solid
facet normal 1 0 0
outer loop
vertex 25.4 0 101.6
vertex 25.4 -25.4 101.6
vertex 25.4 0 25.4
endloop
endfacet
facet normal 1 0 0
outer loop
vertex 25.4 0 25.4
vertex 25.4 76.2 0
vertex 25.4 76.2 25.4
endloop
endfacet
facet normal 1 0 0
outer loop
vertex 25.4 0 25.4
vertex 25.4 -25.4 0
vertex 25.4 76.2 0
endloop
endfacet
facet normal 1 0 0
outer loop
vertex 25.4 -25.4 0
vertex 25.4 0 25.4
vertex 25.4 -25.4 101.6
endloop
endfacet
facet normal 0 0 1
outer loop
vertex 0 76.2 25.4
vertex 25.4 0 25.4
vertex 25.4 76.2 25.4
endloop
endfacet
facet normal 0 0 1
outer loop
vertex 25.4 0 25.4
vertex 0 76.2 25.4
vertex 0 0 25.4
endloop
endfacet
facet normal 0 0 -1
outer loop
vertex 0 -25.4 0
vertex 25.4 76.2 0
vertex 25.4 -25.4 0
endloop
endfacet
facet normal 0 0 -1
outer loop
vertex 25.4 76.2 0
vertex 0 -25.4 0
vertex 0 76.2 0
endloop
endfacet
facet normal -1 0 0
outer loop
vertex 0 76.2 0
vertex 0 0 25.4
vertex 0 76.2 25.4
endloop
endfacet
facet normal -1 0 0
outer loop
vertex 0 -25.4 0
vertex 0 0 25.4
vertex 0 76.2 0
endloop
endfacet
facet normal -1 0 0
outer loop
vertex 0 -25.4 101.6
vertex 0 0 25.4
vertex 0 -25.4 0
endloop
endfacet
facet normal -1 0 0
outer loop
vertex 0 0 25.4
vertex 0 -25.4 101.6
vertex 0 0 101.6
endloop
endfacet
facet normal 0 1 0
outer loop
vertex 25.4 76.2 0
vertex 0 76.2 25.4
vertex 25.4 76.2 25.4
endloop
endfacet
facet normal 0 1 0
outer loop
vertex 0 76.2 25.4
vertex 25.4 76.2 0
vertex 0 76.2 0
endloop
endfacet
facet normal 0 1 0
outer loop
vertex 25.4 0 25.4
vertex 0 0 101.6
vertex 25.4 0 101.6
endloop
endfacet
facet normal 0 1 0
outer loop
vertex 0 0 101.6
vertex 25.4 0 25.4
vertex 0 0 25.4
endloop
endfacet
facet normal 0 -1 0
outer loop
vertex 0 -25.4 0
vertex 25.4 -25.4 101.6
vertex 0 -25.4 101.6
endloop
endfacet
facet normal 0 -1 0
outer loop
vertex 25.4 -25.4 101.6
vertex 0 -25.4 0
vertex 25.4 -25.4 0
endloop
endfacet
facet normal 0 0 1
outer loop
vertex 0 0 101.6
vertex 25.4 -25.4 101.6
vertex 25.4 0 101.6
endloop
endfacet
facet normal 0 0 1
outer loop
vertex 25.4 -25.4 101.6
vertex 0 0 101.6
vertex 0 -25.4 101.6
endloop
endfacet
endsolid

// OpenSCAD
inch = 25.4;

cube([inch, (3 * inch), inch]);

rotate([90, 0, 0]) {
    cube([inch, (4 * inch), inch]);
}
